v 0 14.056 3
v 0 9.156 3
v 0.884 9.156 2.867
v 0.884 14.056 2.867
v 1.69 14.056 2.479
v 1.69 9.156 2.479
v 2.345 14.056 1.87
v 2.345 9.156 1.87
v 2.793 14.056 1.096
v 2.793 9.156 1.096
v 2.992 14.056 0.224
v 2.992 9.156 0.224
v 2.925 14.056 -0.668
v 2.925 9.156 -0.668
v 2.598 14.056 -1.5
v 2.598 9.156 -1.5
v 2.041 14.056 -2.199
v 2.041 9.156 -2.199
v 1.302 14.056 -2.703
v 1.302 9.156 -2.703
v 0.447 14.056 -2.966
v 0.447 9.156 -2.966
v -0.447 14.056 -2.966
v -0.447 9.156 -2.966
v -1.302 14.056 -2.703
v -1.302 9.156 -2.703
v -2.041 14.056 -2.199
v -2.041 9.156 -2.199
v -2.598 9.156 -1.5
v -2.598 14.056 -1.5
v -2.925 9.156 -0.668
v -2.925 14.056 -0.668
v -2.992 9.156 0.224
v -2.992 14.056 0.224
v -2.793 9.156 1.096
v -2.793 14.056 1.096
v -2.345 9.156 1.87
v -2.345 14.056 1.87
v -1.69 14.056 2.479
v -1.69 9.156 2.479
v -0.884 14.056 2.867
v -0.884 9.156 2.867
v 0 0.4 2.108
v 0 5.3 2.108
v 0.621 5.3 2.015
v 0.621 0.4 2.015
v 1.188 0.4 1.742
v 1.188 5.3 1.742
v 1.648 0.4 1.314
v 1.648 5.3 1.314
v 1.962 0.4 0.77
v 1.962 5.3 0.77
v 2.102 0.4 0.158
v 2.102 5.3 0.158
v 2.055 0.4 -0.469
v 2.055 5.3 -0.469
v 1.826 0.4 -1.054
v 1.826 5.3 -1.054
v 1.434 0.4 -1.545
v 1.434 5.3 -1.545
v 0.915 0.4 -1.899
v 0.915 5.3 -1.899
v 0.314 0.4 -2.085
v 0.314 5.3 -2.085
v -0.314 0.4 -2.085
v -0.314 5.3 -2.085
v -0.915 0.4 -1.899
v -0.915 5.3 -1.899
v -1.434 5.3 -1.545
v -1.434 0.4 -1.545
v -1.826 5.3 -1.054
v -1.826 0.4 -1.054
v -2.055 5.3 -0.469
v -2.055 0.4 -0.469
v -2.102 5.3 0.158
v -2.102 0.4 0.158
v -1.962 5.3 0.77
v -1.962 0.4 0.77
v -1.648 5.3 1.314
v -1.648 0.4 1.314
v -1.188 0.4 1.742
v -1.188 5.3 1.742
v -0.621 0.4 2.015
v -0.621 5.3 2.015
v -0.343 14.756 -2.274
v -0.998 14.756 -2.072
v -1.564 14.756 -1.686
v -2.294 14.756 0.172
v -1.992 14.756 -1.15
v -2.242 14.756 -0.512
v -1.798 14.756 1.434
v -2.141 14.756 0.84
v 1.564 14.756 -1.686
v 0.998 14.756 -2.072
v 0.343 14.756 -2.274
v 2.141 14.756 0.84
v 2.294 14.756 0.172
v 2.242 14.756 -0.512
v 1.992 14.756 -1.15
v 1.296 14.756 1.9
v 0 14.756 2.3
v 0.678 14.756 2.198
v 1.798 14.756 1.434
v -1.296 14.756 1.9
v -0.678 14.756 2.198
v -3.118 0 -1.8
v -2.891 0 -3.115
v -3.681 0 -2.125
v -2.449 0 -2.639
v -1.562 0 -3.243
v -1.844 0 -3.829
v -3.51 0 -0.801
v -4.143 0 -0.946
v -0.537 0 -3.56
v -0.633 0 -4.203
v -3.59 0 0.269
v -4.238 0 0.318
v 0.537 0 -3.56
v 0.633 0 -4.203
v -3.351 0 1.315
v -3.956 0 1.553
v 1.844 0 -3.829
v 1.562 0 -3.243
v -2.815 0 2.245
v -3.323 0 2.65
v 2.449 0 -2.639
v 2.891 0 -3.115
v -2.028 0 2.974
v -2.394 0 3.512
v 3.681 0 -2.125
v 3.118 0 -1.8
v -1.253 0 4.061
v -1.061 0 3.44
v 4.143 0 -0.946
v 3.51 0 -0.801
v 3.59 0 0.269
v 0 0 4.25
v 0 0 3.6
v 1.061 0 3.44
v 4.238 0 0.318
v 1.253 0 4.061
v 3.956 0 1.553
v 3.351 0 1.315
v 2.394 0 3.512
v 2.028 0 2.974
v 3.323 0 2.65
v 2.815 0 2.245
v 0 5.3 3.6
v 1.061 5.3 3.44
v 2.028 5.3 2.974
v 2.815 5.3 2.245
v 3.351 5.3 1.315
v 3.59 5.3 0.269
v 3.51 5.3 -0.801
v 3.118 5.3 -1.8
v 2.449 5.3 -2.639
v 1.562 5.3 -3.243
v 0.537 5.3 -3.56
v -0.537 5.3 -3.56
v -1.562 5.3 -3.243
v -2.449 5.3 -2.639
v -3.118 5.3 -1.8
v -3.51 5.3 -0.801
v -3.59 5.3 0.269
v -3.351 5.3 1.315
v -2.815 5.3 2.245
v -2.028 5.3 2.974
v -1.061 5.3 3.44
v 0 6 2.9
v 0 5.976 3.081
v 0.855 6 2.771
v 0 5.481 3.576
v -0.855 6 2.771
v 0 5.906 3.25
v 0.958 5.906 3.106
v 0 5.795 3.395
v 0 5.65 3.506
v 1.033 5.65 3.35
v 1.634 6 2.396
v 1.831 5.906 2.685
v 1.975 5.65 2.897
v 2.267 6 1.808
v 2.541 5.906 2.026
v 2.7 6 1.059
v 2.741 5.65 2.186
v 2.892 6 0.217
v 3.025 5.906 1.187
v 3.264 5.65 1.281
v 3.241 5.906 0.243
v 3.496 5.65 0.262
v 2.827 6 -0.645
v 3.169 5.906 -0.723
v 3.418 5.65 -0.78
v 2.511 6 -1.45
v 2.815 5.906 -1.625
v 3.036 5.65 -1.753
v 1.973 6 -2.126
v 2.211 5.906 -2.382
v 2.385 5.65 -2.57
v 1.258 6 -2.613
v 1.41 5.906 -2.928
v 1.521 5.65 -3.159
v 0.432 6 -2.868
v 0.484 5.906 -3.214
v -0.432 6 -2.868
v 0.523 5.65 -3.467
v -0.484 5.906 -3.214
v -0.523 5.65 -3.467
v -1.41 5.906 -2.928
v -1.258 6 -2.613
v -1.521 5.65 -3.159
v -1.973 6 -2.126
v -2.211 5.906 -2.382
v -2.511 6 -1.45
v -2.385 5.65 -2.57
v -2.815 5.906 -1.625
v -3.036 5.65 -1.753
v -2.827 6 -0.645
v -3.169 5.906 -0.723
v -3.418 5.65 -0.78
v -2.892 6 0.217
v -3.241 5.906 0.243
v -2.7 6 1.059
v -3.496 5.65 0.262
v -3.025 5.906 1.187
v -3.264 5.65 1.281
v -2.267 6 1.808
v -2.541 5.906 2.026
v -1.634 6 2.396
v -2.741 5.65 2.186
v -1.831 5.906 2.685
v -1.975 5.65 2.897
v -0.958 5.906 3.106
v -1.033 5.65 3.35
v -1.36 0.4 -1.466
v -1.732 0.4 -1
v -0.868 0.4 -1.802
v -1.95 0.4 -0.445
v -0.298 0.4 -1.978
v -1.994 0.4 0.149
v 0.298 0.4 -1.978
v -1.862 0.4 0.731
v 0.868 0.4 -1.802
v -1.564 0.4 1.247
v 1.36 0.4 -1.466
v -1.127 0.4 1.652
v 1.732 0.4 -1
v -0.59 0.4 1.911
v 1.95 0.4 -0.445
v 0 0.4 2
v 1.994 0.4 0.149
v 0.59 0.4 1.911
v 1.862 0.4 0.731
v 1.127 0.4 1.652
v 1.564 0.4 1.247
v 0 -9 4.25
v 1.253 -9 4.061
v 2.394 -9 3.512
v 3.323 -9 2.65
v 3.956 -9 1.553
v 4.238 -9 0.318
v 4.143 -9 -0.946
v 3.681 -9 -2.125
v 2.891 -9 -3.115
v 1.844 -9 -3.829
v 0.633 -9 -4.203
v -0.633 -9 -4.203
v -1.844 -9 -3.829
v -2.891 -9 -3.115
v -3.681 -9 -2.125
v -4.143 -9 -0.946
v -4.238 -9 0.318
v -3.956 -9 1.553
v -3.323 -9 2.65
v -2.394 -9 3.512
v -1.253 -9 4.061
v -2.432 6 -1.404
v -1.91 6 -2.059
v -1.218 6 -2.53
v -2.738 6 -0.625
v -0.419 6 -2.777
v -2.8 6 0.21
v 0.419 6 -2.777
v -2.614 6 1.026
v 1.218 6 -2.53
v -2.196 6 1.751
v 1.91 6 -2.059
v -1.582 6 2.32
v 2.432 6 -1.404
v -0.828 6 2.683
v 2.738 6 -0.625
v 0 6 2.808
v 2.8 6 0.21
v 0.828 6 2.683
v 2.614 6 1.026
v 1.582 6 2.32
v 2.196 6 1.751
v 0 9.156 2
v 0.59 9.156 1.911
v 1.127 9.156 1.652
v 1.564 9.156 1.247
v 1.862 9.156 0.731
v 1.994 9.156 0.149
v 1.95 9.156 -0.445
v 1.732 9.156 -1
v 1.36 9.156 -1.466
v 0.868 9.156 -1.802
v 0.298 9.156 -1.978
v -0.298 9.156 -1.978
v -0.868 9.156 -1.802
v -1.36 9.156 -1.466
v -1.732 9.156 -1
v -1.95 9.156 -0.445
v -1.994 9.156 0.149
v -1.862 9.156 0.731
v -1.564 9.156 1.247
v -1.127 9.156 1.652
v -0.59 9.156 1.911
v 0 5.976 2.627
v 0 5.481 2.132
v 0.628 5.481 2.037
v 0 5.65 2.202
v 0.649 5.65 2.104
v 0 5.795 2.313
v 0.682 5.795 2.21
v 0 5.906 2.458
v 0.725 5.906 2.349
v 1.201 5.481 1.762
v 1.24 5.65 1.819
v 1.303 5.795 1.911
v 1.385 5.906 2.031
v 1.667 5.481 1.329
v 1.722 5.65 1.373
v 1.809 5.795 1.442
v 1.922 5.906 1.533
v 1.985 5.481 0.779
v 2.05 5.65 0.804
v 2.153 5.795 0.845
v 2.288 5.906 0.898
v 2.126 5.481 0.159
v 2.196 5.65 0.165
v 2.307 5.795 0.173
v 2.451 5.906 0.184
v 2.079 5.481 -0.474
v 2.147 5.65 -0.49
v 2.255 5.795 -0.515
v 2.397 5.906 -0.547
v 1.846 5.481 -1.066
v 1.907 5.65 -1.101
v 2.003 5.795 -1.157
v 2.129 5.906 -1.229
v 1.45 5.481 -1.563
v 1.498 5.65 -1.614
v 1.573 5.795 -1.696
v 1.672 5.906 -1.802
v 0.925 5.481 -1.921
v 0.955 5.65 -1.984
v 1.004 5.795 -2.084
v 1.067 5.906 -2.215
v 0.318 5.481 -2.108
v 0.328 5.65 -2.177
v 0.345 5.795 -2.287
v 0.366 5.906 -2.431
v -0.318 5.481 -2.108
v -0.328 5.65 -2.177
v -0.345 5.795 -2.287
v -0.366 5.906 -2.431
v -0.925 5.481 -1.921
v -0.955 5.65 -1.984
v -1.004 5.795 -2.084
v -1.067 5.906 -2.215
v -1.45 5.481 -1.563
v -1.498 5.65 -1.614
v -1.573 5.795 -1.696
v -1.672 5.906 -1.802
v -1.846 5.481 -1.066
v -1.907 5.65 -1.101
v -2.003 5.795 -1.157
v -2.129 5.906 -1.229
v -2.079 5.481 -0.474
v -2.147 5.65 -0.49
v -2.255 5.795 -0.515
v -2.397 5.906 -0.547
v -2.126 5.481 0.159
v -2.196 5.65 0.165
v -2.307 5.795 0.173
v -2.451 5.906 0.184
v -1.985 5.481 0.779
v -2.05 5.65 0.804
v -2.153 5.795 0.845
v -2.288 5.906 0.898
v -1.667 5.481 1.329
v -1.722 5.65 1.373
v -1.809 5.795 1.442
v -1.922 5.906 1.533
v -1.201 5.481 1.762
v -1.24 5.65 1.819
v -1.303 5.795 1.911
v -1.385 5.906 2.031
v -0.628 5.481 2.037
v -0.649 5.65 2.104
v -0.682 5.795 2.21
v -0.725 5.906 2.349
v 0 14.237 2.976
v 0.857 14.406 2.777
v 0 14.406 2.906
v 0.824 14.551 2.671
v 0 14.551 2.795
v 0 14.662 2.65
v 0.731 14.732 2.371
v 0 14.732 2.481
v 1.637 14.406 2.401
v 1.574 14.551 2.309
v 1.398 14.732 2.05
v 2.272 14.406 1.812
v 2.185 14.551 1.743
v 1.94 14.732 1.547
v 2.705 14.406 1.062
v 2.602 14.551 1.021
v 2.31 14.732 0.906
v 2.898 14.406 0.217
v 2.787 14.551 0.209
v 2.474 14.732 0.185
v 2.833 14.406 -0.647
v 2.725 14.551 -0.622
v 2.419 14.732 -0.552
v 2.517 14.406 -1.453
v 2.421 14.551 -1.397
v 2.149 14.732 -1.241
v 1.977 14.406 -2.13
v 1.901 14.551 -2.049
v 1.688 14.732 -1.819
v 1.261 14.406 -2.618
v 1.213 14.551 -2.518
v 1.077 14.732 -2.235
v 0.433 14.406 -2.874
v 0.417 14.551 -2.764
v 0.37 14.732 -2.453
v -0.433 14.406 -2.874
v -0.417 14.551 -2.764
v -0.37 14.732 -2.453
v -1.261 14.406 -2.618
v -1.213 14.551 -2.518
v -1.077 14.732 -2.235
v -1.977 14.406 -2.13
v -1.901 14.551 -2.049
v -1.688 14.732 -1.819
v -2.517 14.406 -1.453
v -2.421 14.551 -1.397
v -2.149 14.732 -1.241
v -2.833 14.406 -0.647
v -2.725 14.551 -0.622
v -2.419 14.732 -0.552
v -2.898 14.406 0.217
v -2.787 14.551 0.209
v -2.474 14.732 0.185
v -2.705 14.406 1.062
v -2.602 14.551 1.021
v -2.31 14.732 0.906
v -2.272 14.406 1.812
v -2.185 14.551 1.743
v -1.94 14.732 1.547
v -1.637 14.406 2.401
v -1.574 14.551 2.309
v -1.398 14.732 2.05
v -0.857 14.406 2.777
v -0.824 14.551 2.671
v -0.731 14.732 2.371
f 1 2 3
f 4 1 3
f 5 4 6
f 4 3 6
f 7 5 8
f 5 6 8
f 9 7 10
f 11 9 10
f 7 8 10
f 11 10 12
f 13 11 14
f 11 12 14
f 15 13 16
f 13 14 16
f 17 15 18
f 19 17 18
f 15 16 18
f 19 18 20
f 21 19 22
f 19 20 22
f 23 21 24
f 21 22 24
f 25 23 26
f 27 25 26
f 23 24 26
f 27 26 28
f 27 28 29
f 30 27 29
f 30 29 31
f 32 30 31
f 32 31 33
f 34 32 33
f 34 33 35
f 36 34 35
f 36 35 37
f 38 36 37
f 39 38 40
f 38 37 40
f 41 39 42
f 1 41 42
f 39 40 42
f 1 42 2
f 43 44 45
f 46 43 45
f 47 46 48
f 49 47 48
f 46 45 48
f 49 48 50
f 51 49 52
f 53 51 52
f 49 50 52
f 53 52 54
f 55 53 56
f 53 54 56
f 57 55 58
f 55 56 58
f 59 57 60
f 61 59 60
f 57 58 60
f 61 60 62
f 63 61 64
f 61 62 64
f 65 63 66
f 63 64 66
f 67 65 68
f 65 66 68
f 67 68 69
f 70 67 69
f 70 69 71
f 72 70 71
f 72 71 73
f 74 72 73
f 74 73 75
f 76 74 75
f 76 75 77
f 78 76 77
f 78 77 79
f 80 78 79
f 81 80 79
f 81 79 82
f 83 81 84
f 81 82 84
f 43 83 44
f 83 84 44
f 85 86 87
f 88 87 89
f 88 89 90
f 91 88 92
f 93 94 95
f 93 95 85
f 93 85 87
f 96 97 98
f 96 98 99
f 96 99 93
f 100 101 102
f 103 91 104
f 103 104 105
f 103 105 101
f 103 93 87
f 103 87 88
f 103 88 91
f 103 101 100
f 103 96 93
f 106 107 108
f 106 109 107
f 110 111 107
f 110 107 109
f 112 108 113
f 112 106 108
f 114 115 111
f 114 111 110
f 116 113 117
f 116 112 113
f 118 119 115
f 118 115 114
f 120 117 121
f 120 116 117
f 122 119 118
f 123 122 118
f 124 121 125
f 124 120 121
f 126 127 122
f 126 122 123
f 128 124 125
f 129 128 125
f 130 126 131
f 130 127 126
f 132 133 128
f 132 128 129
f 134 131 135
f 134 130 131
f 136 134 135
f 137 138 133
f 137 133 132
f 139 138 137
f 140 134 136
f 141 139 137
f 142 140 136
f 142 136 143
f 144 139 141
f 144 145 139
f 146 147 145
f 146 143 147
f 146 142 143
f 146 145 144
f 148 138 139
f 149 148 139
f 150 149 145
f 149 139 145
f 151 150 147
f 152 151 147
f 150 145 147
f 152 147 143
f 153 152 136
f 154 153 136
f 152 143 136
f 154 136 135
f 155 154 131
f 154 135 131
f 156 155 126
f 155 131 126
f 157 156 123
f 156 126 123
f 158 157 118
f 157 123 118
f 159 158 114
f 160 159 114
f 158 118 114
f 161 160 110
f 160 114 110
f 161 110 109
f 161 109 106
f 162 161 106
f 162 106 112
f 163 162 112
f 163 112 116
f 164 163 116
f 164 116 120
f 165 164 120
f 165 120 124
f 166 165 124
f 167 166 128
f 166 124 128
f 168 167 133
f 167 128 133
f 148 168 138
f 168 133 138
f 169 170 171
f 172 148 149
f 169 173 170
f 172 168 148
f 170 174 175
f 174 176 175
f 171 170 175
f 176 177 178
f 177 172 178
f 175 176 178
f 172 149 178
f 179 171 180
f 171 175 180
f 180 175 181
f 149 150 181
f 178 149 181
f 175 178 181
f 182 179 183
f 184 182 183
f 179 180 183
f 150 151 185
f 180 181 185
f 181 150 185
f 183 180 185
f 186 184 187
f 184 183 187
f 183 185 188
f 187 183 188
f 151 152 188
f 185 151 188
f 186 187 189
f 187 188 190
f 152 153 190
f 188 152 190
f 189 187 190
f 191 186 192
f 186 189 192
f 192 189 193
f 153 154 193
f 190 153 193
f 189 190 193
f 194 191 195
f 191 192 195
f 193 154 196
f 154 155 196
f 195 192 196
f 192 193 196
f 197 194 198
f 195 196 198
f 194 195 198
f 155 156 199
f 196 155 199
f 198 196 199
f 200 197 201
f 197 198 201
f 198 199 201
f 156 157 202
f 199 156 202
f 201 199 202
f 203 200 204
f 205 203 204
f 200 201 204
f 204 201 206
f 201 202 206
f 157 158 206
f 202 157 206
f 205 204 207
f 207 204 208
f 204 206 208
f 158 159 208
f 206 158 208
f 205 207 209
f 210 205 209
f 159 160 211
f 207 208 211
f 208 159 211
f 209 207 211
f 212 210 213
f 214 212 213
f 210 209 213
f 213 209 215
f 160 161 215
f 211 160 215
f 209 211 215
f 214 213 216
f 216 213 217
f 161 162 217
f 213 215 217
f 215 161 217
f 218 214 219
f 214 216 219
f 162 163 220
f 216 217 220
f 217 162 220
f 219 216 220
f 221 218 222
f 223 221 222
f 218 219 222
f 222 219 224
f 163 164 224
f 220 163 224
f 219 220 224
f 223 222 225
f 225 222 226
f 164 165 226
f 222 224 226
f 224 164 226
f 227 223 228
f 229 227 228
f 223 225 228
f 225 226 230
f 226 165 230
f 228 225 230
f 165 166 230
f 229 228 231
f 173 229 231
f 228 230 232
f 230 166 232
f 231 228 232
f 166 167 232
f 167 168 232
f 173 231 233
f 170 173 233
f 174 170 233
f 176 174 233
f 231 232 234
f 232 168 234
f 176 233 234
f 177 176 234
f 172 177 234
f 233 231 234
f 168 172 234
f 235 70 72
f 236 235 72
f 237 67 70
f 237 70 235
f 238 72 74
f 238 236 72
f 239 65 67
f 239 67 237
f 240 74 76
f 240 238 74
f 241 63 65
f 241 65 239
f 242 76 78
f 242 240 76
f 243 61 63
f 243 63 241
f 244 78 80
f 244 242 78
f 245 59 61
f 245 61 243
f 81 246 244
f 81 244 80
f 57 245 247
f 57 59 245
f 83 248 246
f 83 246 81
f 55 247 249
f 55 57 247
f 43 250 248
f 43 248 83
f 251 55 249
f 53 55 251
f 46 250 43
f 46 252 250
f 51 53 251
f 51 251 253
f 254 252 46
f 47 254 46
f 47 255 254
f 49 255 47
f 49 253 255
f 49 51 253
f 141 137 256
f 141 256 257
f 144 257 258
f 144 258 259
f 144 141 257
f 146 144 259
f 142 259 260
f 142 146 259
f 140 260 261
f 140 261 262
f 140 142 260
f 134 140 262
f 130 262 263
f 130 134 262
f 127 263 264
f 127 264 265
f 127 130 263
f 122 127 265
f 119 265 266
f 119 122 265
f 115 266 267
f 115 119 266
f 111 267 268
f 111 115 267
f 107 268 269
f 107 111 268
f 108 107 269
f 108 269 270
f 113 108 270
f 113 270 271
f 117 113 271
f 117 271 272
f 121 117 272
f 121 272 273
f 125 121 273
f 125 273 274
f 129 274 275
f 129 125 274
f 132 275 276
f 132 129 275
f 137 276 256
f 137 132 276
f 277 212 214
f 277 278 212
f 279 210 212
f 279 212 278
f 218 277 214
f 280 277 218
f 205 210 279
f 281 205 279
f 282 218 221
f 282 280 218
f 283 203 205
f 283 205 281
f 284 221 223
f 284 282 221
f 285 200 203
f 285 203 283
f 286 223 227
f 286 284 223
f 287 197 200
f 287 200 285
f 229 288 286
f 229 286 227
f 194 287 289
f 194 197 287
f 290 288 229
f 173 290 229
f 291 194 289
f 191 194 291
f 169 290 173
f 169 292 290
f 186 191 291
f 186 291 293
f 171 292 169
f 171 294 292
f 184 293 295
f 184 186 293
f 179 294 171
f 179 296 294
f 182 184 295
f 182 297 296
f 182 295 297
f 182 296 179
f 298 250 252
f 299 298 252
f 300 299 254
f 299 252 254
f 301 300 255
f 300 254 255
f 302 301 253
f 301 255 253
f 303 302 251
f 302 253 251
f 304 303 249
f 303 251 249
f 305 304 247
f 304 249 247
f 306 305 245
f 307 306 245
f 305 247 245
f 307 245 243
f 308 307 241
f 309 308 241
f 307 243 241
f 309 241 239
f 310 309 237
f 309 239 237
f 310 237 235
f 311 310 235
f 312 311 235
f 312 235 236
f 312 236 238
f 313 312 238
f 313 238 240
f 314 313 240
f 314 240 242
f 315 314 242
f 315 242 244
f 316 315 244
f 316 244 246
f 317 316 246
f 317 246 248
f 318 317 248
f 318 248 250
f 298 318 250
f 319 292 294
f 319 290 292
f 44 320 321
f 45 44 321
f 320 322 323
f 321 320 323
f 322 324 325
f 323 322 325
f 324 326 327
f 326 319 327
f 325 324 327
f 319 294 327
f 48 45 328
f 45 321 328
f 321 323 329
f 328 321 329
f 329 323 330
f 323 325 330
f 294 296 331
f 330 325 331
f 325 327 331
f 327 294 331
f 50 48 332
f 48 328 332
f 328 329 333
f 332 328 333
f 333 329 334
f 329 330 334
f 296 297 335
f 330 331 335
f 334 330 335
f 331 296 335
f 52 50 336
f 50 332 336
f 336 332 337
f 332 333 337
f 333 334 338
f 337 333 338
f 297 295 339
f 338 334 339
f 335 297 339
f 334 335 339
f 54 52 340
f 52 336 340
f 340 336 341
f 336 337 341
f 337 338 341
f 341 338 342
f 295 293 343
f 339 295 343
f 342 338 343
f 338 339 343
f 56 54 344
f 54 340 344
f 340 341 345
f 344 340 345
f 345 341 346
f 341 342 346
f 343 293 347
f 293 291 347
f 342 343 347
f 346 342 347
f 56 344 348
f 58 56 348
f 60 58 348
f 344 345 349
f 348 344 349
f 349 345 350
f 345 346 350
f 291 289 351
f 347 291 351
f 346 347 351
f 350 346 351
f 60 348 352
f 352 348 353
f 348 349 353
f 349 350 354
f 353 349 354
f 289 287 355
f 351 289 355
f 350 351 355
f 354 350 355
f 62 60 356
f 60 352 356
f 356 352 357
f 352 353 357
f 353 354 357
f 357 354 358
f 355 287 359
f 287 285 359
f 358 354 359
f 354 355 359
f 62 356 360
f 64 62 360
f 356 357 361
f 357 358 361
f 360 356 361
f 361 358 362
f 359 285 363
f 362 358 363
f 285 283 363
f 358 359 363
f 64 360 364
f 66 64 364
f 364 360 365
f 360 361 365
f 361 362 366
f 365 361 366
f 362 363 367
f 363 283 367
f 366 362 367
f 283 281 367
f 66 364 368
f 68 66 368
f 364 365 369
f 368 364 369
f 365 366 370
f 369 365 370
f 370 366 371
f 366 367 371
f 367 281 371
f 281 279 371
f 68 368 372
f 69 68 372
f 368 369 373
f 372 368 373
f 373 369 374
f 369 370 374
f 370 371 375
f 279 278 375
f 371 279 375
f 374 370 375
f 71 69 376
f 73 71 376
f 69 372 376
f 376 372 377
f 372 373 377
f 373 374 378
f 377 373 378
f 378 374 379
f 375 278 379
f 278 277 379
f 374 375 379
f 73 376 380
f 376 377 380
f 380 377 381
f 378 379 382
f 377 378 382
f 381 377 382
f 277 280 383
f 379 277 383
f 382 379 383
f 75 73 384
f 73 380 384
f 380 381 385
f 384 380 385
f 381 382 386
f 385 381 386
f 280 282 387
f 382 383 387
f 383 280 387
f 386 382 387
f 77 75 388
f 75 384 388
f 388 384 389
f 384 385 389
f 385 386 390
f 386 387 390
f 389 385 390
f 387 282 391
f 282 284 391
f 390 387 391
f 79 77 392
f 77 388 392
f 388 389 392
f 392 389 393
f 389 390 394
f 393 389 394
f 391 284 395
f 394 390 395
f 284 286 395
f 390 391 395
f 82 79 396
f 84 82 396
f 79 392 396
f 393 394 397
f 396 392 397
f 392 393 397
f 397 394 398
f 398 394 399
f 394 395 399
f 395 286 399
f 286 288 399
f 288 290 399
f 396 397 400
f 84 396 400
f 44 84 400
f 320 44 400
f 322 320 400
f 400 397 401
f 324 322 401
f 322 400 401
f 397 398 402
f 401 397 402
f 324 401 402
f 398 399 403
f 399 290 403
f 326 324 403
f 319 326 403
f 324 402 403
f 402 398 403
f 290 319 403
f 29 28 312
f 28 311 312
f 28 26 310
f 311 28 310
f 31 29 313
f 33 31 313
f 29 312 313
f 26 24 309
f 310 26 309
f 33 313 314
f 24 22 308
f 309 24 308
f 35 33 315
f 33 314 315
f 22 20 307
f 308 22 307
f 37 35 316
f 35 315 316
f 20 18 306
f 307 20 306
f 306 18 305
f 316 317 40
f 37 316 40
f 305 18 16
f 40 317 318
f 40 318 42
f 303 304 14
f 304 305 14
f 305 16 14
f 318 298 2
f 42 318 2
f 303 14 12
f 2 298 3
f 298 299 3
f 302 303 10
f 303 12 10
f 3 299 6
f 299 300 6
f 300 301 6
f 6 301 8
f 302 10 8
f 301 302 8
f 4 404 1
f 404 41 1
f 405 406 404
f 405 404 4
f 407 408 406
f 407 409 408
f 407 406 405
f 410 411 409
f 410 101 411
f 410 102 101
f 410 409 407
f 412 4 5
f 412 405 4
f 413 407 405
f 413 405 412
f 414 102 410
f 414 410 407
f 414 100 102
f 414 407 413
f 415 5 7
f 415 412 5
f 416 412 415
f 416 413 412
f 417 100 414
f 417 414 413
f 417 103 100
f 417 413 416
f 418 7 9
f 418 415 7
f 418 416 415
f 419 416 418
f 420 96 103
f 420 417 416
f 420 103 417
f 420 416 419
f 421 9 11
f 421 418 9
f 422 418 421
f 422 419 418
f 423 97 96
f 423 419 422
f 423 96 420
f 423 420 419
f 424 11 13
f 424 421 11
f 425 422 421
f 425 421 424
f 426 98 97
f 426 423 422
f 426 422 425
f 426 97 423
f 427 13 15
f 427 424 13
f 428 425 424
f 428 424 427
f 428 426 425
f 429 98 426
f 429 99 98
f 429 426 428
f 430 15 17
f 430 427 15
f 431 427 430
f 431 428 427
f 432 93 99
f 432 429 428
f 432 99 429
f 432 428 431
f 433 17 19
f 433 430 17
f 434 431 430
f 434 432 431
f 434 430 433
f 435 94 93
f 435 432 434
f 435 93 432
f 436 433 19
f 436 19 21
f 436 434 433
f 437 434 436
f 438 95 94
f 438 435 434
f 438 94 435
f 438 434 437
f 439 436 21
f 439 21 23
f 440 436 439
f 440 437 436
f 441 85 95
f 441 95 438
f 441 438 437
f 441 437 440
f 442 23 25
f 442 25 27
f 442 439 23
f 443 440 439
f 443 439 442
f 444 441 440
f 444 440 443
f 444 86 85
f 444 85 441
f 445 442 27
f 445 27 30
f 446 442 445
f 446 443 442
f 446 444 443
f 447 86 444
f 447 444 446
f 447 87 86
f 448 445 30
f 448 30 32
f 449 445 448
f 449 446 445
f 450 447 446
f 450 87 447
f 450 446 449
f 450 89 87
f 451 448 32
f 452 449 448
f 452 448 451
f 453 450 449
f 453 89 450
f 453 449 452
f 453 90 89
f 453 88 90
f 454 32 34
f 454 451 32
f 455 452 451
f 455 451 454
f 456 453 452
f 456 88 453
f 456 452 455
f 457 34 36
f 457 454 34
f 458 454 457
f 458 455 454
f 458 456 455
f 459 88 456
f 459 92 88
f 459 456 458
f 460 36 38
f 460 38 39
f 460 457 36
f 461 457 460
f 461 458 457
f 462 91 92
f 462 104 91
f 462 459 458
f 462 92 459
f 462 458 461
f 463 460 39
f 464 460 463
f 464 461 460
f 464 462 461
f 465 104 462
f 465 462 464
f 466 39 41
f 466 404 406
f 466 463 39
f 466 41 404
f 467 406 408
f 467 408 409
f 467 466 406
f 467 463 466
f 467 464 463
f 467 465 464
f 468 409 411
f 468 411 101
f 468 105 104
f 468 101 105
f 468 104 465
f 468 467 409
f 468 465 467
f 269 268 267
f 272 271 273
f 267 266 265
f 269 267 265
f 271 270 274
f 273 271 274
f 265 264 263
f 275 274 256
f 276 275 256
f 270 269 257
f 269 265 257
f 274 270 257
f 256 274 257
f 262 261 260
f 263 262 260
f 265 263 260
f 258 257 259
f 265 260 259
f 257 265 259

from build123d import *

# Parameters (mm, degrees)
SKETCH1_R           = 3.6
BOSS_EXTRUDE2_DEPTH = 6
SKETCH4_R           = 4.250000009
BOSS_EXTRUDE3_DEPTH = 9
SKETCH7_R           = 2.1082
CUT_EXTRUDE3_DEPTH  = 5.6
SKETCH5_R           = 2.000000064
BOSS_EXTRUDE6_DEPTH = 9.156
FILLET3_R           = 0.7
SKETCH9_R           = 3.000000096
BOSS_EXTRUDE7_DEPTH = 5.6
FILLET4_R           = 0.7


with BuildPart() as part:
    # Sketch1 → Boss-Extrude2 (new body)
    with BuildSketch(Plane(origin=(0, 0, 0), x_dir=(1, 0, 0), z_dir=(0, 1, 0))):
        with Locations(Location((0, 0, 0), (0, 0, 270))):
            Circle(SKETCH1_R)
    extrude(amount=BOSS_EXTRUDE2_DEPTH)

    # Sketch4 → Boss-Extrude3 (add)
    with BuildSketch(Plane(origin=(0, 0, 0), x_dir=(1, 0, 0), z_dir=(0, 1, 0))):
        with Locations(Location((0, 0, 0), (0, 0, 270))):
            Circle(SKETCH4_R)
    extrude(amount=-BOSS_EXTRUDE3_DEPTH)

    # Sketch7 → Cut-Extrude3 (cut)
    with BuildSketch(Plane(origin=(0, 6, 0), x_dir=(1, 0, 0), z_dir=(0, 1, 0))):
        with Locations(Location((0, 0, 0), (0, 0, 270))):
            Circle(SKETCH7_R)
    extrude(amount=-CUT_EXTRUDE3_DEPTH, mode=Mode.SUBTRACT)

    # Sketch5 → Boss-Extrude6 (add)
    with BuildSketch(Plane(origin=(0, 0, 0), x_dir=(1, 0, 0), z_dir=(0, 1, 0))):
        with Locations(Location((0, 0, 0), (0, 0, 270))):
            Circle(SKETCH5_R)
    extrude(amount=BOSS_EXTRUDE6_DEPTH)

    # Fillet3
    fillet3_edges = [part.edges().sort_by_distance(p)[0] for p in [
        (0, 6, -2.1082),
        (0, 6, -3.6),
    ]]
    fillet(fillet3_edges, radius=FILLET3_R)

    # Sketch9 → Boss-Extrude7 (add)
    with BuildSketch(Plane(origin=(0, 9.156, 0), x_dir=(1, 0, 0), z_dir=(0, 1, 0))):
        with Locations(Location((0, 0, 0), (0, 0, 270))):
            Circle(SKETCH9_R)
    extrude(amount=BOSS_EXTRUDE7_DEPTH)

    # Fillet4
    fillet4_edges = [part.edges().sort_by_distance(p)[0] for p in [
        (0, 14.756, -3.000000096),
    ]]
    fillet(fillet4_edges, radius=FILLET4_R)


solid = part.part
